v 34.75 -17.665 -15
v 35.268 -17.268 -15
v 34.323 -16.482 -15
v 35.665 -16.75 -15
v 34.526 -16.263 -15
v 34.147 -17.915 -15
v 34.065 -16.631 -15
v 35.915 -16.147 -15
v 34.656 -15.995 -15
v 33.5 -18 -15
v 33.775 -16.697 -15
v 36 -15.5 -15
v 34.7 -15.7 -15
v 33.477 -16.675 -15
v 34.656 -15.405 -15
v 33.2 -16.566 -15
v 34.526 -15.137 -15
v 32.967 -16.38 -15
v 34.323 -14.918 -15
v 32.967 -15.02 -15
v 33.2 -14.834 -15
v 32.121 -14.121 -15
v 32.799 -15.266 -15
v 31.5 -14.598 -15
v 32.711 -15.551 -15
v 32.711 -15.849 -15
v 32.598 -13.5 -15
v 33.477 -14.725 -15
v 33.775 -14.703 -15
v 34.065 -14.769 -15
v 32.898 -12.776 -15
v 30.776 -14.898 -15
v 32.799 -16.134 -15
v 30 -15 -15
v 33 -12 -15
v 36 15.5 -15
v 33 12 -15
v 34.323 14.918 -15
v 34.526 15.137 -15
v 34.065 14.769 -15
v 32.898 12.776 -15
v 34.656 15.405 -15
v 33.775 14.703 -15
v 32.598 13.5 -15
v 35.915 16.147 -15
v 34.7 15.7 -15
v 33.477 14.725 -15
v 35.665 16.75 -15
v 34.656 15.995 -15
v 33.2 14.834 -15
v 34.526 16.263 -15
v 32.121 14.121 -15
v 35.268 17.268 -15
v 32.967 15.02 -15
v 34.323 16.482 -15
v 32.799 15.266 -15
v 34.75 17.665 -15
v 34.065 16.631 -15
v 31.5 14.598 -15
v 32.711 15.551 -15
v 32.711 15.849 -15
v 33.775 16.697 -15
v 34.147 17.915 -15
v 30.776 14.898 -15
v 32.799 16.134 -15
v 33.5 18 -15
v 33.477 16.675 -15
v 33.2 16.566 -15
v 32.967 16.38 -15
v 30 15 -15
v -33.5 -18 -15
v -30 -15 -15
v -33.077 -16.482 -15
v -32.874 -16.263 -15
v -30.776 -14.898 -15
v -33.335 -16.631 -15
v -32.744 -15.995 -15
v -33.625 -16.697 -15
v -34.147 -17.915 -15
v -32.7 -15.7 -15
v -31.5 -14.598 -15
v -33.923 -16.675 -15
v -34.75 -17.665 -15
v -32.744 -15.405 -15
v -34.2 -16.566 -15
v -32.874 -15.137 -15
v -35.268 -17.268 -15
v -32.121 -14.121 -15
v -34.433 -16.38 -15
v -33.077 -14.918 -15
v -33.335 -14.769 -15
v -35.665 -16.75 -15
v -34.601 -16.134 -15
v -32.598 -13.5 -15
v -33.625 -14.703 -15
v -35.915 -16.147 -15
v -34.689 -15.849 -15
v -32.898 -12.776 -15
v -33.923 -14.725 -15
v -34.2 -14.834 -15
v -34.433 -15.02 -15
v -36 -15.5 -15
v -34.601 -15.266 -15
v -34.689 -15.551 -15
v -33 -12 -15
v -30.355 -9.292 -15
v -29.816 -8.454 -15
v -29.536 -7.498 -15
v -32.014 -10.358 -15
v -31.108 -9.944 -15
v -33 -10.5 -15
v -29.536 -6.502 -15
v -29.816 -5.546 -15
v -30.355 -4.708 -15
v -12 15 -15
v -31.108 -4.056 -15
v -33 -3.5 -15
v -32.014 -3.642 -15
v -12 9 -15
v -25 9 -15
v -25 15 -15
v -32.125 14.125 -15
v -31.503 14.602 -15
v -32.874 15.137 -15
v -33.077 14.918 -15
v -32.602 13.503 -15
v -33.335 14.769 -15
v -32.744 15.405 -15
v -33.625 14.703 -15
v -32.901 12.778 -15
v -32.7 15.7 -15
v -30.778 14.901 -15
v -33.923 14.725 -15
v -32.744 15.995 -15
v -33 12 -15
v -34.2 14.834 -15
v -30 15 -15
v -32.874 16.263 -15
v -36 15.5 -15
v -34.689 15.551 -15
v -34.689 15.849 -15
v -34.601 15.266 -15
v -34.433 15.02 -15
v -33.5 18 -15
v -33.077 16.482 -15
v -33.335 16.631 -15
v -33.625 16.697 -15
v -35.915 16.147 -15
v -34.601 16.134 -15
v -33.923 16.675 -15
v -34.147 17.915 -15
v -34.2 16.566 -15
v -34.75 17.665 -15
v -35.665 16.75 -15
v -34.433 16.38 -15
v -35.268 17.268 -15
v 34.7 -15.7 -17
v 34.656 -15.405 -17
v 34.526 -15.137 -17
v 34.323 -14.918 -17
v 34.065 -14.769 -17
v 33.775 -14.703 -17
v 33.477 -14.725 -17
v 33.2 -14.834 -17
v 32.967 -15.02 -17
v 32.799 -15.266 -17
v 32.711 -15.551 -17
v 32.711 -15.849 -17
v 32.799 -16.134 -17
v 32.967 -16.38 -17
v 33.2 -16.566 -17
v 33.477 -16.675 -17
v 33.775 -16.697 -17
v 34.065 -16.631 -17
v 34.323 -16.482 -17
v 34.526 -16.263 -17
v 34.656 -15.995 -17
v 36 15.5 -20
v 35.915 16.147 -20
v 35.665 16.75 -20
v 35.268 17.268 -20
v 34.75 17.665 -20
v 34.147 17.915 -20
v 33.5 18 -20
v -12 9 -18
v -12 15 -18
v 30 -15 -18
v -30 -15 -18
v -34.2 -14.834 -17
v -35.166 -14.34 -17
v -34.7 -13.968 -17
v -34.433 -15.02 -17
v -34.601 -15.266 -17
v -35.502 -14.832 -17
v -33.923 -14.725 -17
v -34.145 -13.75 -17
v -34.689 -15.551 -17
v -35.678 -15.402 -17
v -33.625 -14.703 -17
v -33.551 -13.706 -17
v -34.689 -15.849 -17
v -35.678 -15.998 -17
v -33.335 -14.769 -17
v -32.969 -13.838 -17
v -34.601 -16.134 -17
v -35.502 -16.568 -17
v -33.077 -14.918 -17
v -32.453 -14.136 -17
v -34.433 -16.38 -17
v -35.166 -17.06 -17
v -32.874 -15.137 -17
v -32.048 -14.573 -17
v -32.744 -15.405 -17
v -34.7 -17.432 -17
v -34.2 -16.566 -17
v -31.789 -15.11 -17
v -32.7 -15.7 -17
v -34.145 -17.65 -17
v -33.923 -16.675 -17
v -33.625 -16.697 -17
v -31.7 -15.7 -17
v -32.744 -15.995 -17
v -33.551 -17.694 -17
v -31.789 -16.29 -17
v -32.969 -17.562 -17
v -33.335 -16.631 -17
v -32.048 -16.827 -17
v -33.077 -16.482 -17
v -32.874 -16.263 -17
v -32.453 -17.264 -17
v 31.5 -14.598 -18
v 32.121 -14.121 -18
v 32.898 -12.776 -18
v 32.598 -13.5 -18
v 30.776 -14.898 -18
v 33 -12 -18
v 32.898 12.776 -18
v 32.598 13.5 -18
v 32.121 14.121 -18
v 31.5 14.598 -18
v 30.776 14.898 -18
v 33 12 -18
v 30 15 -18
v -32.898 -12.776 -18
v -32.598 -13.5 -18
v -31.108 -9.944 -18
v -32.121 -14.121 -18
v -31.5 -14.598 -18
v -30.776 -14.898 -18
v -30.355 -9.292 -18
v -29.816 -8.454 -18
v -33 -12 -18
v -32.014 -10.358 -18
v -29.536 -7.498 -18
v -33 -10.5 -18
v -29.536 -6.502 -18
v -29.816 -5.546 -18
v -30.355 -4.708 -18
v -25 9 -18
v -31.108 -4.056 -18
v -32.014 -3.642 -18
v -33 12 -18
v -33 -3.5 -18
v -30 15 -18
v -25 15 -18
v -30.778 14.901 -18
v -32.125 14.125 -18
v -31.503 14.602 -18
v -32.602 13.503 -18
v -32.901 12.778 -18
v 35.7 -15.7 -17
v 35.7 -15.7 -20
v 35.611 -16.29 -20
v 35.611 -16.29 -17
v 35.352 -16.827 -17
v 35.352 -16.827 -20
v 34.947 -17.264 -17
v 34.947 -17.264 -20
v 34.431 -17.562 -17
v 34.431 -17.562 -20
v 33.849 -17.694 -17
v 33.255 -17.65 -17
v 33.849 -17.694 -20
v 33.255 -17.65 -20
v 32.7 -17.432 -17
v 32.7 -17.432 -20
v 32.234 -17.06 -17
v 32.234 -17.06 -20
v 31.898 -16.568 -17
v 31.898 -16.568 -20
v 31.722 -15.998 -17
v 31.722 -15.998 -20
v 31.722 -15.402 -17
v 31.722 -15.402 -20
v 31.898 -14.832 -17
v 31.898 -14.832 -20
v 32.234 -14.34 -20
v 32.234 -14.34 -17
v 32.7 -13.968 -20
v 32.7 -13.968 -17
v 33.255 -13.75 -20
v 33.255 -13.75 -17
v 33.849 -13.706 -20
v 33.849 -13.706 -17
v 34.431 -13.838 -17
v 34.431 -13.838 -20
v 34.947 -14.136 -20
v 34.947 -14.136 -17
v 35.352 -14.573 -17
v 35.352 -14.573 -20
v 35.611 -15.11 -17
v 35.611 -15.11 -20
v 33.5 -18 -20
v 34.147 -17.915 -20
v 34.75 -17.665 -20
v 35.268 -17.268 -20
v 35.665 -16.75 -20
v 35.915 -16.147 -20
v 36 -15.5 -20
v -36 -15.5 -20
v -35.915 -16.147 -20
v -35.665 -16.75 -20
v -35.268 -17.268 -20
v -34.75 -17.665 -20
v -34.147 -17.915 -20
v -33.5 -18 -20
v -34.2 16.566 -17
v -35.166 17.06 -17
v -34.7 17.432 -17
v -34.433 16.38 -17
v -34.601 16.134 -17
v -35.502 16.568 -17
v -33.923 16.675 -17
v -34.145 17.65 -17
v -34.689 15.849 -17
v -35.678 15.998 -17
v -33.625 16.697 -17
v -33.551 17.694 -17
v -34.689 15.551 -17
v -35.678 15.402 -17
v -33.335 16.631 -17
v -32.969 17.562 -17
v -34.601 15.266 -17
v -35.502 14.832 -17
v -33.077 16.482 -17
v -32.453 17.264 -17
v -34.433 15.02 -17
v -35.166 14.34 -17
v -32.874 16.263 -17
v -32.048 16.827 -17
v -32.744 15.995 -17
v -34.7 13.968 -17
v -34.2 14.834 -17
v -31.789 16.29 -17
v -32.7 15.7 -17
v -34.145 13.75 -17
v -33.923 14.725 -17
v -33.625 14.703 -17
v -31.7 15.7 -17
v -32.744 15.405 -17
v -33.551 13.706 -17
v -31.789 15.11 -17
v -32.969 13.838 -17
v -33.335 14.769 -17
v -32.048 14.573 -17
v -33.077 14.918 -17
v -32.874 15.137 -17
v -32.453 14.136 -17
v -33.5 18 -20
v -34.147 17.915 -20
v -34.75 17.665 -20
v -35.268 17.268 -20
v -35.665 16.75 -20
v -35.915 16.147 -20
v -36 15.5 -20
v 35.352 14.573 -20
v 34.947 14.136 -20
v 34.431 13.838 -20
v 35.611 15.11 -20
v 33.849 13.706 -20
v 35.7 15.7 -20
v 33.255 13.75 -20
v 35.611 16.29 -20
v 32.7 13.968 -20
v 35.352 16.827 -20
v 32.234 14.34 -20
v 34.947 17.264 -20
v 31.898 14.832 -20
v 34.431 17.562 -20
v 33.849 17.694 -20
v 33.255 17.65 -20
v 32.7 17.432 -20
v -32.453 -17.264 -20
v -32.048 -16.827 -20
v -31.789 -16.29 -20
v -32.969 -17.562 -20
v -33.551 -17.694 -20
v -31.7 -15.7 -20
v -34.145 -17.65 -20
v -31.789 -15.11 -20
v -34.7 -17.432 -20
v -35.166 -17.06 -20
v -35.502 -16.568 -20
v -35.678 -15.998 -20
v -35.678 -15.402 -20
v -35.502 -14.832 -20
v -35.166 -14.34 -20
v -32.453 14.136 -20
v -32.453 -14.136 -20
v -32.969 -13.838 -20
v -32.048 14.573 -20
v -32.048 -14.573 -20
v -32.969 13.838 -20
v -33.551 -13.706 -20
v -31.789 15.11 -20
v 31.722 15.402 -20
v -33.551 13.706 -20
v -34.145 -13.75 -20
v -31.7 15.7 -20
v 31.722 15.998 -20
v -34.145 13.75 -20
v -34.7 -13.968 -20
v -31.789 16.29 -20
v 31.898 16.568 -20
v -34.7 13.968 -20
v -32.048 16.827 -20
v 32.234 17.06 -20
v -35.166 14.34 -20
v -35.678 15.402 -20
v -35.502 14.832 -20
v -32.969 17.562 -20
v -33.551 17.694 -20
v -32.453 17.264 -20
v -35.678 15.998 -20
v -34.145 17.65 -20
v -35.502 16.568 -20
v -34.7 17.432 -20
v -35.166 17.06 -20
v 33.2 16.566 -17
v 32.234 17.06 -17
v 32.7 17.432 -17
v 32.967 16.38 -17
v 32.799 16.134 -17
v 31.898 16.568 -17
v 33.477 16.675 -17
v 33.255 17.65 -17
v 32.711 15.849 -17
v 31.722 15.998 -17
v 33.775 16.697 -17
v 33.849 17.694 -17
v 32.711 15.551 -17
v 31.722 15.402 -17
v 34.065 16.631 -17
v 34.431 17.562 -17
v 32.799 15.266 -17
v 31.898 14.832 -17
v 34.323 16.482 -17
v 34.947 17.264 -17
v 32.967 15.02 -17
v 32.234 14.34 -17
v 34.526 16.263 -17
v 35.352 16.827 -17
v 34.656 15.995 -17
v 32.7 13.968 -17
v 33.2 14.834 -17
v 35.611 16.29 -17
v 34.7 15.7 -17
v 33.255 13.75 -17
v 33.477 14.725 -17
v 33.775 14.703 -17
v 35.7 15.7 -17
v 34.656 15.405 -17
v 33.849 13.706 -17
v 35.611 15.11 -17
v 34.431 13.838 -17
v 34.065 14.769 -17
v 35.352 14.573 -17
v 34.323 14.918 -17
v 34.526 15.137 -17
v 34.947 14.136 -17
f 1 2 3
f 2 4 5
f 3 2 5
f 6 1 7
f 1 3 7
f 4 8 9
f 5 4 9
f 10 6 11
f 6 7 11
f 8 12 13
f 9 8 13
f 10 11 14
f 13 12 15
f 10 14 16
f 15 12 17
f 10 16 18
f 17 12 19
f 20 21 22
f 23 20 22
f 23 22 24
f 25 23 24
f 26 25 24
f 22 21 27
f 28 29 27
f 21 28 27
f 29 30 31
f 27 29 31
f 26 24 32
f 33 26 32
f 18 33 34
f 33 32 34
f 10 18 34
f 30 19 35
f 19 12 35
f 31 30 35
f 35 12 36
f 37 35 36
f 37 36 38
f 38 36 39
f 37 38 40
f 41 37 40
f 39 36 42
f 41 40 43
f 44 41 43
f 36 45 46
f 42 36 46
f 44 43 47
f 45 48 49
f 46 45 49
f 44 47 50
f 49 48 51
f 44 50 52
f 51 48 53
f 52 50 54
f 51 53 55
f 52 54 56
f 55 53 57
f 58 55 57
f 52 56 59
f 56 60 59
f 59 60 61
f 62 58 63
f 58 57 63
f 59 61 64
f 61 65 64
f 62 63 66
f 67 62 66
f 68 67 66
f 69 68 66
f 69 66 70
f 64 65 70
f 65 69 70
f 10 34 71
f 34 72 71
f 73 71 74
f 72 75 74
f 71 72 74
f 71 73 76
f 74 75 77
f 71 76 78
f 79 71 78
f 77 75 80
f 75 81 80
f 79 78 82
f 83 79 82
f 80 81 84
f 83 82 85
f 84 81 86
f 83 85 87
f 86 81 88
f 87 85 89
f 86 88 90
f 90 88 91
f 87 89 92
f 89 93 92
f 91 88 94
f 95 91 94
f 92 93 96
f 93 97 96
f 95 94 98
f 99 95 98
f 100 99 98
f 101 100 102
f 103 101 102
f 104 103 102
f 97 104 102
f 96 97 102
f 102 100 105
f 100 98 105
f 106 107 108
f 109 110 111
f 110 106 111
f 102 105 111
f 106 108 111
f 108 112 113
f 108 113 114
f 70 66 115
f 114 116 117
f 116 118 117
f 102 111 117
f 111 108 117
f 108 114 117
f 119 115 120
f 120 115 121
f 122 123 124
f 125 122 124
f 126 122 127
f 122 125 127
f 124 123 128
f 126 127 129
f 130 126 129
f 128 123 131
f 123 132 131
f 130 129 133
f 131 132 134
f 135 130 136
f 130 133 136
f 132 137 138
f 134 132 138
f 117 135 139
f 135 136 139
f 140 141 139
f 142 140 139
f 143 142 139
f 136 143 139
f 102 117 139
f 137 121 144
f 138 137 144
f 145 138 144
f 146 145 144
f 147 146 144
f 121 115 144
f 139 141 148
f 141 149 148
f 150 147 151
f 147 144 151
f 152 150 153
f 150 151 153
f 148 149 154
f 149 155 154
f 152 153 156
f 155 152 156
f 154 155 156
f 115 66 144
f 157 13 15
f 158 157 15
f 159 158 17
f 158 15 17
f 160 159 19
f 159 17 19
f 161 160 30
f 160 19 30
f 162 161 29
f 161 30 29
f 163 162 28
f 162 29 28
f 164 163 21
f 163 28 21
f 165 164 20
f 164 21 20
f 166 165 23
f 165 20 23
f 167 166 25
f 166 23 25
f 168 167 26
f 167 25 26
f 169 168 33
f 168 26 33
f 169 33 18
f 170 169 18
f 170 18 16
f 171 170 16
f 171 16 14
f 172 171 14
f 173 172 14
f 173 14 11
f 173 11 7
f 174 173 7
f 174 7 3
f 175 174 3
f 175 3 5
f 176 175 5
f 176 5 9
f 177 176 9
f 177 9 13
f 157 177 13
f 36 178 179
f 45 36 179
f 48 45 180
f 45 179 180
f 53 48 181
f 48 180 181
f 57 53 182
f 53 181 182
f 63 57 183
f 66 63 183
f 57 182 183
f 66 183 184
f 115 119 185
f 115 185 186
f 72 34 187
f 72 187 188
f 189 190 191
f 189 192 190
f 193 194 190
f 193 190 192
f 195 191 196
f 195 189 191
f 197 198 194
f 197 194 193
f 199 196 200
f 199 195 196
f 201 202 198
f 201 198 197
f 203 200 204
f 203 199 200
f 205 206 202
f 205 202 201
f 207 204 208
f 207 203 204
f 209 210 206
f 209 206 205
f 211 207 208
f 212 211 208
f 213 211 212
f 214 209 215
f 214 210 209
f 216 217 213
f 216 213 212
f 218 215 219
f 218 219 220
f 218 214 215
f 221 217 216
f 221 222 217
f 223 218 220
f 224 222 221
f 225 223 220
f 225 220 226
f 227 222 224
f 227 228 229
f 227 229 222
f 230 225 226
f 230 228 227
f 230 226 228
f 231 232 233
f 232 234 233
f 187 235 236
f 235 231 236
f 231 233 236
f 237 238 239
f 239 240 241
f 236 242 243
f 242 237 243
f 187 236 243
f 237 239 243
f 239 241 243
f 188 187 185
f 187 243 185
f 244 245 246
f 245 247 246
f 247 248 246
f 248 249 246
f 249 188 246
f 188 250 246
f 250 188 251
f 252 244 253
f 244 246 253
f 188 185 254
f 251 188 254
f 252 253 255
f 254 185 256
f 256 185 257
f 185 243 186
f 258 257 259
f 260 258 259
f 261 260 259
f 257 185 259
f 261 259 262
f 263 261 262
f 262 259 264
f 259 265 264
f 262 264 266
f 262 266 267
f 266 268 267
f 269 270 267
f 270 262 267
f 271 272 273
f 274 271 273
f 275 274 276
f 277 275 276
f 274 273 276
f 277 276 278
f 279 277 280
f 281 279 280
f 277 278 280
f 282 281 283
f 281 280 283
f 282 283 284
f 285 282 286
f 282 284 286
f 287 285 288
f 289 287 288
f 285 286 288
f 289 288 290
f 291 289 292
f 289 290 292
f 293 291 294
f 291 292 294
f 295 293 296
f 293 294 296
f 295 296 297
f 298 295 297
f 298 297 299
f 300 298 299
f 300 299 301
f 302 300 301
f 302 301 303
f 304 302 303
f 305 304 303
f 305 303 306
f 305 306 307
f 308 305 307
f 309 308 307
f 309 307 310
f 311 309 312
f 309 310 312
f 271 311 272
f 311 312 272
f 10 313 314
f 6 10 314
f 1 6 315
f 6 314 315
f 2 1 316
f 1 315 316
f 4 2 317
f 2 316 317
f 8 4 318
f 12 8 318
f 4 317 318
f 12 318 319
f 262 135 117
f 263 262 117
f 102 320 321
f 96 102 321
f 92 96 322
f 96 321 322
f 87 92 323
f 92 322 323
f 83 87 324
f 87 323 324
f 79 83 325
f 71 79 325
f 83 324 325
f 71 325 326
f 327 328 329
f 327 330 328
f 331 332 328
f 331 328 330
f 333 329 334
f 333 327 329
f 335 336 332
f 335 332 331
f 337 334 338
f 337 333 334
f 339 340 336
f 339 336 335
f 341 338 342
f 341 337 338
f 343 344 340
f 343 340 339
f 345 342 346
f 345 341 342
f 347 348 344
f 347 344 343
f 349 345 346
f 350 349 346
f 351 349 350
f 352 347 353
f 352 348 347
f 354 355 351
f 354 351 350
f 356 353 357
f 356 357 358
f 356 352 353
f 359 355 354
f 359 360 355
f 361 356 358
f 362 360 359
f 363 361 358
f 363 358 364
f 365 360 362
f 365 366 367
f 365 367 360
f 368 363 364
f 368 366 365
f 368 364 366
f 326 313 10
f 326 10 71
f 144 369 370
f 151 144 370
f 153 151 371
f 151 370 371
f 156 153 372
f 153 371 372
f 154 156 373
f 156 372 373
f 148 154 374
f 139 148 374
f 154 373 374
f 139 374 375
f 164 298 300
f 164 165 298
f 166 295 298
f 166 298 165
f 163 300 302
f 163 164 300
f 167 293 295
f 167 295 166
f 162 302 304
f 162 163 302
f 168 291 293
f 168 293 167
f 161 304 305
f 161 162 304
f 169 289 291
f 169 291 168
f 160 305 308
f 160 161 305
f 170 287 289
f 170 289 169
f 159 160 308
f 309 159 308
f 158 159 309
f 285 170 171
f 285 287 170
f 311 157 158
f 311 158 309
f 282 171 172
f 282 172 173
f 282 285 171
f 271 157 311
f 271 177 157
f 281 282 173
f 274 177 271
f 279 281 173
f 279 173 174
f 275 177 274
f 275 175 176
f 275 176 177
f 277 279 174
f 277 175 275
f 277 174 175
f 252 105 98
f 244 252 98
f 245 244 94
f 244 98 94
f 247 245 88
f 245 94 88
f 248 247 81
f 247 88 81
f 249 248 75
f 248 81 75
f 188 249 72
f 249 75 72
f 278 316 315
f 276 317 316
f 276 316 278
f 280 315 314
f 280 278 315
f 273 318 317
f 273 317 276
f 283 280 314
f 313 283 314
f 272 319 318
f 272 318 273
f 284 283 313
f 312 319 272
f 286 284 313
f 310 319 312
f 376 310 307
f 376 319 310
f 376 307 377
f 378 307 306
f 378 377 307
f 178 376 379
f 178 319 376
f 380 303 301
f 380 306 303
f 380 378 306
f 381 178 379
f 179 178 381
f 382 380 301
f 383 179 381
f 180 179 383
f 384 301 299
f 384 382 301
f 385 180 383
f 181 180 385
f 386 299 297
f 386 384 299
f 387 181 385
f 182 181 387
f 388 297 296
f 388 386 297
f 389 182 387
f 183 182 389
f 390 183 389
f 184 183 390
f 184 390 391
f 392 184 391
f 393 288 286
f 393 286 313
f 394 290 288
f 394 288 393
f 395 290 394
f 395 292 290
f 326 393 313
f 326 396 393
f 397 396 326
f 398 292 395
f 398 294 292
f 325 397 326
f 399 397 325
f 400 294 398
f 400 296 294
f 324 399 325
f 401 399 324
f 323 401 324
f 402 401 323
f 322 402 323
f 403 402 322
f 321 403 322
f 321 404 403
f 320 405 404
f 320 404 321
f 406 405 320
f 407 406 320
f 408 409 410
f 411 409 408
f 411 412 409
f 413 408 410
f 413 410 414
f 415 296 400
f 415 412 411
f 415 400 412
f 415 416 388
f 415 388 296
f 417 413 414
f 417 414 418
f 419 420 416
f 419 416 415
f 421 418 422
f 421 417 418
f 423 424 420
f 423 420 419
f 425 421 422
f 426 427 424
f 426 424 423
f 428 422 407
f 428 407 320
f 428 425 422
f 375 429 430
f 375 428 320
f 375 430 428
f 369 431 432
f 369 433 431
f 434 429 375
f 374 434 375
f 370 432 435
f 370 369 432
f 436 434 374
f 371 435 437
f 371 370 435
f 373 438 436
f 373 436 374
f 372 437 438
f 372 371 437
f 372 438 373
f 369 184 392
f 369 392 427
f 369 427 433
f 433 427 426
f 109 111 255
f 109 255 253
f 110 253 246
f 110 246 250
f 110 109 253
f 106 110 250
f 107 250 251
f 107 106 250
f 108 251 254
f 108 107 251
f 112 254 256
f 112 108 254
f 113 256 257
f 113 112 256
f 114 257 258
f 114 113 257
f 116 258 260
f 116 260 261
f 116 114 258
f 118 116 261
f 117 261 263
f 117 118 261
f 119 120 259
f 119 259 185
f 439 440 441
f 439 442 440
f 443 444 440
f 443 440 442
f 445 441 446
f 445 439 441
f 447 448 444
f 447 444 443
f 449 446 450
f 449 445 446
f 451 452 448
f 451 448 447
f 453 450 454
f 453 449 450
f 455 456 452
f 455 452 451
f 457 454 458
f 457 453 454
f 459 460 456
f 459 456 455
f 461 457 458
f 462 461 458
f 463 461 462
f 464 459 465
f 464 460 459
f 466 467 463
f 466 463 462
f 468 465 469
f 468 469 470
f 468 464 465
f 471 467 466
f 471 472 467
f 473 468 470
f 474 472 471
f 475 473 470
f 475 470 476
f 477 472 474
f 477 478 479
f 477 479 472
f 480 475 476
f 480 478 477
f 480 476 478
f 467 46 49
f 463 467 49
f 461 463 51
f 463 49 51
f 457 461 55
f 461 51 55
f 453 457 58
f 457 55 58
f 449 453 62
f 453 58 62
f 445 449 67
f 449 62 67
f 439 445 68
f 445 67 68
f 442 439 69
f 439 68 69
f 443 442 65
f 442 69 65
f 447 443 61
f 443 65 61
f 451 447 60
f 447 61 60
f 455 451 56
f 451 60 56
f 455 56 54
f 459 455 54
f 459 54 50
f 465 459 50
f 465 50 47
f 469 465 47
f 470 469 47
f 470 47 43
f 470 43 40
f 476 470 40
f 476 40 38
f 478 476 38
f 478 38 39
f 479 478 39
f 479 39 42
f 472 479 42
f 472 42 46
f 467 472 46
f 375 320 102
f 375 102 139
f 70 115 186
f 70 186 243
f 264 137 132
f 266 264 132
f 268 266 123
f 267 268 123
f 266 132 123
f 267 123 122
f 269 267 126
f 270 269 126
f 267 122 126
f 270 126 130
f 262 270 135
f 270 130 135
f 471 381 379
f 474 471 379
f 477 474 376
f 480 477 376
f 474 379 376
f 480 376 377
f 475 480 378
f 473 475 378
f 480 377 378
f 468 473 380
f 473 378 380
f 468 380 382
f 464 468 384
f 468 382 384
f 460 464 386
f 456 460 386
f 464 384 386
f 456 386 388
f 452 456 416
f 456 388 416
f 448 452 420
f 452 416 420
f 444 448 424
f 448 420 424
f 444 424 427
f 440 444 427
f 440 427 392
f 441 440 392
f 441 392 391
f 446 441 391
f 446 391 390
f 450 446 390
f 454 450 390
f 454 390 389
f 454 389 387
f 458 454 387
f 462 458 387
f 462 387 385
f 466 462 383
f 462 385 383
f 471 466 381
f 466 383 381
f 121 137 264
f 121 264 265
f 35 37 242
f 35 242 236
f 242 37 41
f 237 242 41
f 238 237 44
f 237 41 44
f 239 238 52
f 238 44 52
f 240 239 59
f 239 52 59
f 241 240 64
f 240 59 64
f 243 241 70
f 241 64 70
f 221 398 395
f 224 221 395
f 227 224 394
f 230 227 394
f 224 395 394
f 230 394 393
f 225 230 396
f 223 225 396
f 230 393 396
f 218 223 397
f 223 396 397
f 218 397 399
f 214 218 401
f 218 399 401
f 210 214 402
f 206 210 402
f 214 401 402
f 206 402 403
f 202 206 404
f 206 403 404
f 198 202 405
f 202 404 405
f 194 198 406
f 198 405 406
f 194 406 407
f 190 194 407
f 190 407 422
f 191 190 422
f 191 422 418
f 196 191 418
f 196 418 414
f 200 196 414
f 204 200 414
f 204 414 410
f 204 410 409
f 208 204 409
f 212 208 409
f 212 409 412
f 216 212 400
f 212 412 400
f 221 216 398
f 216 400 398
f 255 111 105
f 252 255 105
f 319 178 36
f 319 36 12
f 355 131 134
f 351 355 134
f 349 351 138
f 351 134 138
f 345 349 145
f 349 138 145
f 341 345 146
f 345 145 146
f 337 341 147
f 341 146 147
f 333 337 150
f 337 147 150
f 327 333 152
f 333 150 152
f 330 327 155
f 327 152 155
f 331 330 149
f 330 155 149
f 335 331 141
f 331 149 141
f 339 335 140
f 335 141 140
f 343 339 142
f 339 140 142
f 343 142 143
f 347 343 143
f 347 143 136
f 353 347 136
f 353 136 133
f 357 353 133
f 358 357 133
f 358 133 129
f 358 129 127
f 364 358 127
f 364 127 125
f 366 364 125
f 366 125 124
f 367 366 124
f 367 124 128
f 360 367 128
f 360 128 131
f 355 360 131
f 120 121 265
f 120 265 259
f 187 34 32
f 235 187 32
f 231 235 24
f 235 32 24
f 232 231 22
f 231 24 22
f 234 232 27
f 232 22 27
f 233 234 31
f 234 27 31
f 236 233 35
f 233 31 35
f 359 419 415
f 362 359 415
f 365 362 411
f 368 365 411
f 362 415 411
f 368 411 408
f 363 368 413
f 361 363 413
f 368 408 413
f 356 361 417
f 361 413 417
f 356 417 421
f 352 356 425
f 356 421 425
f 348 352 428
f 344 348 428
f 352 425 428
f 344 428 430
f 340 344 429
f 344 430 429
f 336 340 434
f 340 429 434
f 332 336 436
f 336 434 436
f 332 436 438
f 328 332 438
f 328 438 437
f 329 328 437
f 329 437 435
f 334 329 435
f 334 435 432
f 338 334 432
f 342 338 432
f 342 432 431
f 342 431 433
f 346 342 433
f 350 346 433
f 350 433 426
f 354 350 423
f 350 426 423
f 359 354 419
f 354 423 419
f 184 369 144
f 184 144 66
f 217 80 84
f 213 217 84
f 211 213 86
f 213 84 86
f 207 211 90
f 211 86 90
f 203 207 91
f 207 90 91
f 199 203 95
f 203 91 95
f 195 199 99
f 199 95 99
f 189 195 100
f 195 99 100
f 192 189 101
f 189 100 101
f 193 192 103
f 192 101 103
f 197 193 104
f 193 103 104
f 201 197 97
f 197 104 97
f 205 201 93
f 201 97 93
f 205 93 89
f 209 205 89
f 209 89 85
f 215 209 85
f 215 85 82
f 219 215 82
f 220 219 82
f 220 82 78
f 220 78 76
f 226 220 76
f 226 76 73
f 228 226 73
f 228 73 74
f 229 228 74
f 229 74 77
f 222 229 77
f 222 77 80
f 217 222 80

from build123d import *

# Parameters (mm, degrees)
PAD002_DEPTH    = 5
SKETCH012_R     = 1
POCKET008_DEPTH = 20.001
SKETCH013_R     = 2
POCKET009_DEPTH = 3
POCKET010_DEPTH = 3


with BuildPart() as part:
    # Sketch010 → Pad002 (new body)
    with BuildSketch(Plane.XY.offset(-20)):
        with BuildLine():
            Line((-33.5, 18), (33.5, 18))
            ThreePointArc((36, 15.5), (35.267767, 17.267767), (33.5, 18))
            Line((36, 15.5), (36, -15.5))
            ThreePointArc((33.5, -18), (35.267767, -17.267767), (36, -15.5))
            Line((33.5, -18), (-33.5, -18))
            ThreePointArc((-36, -15.5), (-35.267767, -17.267767), (-33.5, -18))
            Line((-36, -15.5), (-36, 15.5))
            ThreePointArc((-33.5, 18), (-35.267767, 17.267767), (-36, 15.5))
        make_face()
    extrude(amount=PAD002_DEPTH)

    # Sketch012 (on Pad) → Pocket008 (cut, through all)
    with BuildSketch(Plane.XY):
        with Locations((-33.7, 15.7)):
            Circle(SKETCH012_R)
        with Locations((33.7, 15.7)):
            Circle(SKETCH012_R)
        with Locations((33.7, -15.7)):
            Circle(SKETCH012_R)
        with Locations((-33.7, -15.7)):
            Circle(SKETCH012_R)
    extrude(amount=-POCKET008_DEPTH, mode=Mode.SUBTRACT)

    # Sketch013 (on Face4 of Pocket008) → Pocket009 (cut)
    with BuildSketch(Plane(origin=(0, 0, -20), x_dir=(1, 0, 0), z_dir=(0, 0, -1))):
        with Locations((-33.7, 15.7)):
            Circle(SKETCH013_R)
        with Locations((33.7, 15.7)):
            Circle(SKETCH013_R)
        with Locations((33.7, -15.7)):
            Circle(SKETCH013_R)
        with Locations((-33.7, -15.7)):
            Circle(SKETCH013_R)
    extrude(amount=-POCKET009_DEPTH, mode=Mode.SUBTRACT)

    # Sketch011 (on Face10 of Pad002) → Pocket010 (cut)
    with BuildSketch(Plane.XY.offset(-15)):
        with BuildLine():
            Line((33, 12), (33, -12))
            ThreePointArc((30, -15), (32.12132, -14.12132), (33, -12))
            Line((30, -15), (-30, -15))
            ThreePointArc((-33, -12), (-32.12132, -14.12132), (-30, -15))
            Line((-33, -10.5), (-33, -12))
            ThreePointArc((-33, -10.5), (-29.5, -7), (-33, -3.5))
            Line((-33, 12), (-33, -3.5))
            ThreePointArc((-30, 15), (-32.125281, 14.125281), (-33, 12))
            Line((-30, 15), (-25, 15))
            Line((-25, 15), (-25, 9))
            Line((-25, 9), (-12, 9))
            Line((-12, 9), (-12, 15))
            Line((-12, 15), (30, 15))
            ThreePointArc((33, 12), (32.12132, 14.12132), (30, 15))
        make_face()
    extrude(amount=-POCKET010_DEPTH, mode=Mode.SUBTRACT)


solid = part.part
